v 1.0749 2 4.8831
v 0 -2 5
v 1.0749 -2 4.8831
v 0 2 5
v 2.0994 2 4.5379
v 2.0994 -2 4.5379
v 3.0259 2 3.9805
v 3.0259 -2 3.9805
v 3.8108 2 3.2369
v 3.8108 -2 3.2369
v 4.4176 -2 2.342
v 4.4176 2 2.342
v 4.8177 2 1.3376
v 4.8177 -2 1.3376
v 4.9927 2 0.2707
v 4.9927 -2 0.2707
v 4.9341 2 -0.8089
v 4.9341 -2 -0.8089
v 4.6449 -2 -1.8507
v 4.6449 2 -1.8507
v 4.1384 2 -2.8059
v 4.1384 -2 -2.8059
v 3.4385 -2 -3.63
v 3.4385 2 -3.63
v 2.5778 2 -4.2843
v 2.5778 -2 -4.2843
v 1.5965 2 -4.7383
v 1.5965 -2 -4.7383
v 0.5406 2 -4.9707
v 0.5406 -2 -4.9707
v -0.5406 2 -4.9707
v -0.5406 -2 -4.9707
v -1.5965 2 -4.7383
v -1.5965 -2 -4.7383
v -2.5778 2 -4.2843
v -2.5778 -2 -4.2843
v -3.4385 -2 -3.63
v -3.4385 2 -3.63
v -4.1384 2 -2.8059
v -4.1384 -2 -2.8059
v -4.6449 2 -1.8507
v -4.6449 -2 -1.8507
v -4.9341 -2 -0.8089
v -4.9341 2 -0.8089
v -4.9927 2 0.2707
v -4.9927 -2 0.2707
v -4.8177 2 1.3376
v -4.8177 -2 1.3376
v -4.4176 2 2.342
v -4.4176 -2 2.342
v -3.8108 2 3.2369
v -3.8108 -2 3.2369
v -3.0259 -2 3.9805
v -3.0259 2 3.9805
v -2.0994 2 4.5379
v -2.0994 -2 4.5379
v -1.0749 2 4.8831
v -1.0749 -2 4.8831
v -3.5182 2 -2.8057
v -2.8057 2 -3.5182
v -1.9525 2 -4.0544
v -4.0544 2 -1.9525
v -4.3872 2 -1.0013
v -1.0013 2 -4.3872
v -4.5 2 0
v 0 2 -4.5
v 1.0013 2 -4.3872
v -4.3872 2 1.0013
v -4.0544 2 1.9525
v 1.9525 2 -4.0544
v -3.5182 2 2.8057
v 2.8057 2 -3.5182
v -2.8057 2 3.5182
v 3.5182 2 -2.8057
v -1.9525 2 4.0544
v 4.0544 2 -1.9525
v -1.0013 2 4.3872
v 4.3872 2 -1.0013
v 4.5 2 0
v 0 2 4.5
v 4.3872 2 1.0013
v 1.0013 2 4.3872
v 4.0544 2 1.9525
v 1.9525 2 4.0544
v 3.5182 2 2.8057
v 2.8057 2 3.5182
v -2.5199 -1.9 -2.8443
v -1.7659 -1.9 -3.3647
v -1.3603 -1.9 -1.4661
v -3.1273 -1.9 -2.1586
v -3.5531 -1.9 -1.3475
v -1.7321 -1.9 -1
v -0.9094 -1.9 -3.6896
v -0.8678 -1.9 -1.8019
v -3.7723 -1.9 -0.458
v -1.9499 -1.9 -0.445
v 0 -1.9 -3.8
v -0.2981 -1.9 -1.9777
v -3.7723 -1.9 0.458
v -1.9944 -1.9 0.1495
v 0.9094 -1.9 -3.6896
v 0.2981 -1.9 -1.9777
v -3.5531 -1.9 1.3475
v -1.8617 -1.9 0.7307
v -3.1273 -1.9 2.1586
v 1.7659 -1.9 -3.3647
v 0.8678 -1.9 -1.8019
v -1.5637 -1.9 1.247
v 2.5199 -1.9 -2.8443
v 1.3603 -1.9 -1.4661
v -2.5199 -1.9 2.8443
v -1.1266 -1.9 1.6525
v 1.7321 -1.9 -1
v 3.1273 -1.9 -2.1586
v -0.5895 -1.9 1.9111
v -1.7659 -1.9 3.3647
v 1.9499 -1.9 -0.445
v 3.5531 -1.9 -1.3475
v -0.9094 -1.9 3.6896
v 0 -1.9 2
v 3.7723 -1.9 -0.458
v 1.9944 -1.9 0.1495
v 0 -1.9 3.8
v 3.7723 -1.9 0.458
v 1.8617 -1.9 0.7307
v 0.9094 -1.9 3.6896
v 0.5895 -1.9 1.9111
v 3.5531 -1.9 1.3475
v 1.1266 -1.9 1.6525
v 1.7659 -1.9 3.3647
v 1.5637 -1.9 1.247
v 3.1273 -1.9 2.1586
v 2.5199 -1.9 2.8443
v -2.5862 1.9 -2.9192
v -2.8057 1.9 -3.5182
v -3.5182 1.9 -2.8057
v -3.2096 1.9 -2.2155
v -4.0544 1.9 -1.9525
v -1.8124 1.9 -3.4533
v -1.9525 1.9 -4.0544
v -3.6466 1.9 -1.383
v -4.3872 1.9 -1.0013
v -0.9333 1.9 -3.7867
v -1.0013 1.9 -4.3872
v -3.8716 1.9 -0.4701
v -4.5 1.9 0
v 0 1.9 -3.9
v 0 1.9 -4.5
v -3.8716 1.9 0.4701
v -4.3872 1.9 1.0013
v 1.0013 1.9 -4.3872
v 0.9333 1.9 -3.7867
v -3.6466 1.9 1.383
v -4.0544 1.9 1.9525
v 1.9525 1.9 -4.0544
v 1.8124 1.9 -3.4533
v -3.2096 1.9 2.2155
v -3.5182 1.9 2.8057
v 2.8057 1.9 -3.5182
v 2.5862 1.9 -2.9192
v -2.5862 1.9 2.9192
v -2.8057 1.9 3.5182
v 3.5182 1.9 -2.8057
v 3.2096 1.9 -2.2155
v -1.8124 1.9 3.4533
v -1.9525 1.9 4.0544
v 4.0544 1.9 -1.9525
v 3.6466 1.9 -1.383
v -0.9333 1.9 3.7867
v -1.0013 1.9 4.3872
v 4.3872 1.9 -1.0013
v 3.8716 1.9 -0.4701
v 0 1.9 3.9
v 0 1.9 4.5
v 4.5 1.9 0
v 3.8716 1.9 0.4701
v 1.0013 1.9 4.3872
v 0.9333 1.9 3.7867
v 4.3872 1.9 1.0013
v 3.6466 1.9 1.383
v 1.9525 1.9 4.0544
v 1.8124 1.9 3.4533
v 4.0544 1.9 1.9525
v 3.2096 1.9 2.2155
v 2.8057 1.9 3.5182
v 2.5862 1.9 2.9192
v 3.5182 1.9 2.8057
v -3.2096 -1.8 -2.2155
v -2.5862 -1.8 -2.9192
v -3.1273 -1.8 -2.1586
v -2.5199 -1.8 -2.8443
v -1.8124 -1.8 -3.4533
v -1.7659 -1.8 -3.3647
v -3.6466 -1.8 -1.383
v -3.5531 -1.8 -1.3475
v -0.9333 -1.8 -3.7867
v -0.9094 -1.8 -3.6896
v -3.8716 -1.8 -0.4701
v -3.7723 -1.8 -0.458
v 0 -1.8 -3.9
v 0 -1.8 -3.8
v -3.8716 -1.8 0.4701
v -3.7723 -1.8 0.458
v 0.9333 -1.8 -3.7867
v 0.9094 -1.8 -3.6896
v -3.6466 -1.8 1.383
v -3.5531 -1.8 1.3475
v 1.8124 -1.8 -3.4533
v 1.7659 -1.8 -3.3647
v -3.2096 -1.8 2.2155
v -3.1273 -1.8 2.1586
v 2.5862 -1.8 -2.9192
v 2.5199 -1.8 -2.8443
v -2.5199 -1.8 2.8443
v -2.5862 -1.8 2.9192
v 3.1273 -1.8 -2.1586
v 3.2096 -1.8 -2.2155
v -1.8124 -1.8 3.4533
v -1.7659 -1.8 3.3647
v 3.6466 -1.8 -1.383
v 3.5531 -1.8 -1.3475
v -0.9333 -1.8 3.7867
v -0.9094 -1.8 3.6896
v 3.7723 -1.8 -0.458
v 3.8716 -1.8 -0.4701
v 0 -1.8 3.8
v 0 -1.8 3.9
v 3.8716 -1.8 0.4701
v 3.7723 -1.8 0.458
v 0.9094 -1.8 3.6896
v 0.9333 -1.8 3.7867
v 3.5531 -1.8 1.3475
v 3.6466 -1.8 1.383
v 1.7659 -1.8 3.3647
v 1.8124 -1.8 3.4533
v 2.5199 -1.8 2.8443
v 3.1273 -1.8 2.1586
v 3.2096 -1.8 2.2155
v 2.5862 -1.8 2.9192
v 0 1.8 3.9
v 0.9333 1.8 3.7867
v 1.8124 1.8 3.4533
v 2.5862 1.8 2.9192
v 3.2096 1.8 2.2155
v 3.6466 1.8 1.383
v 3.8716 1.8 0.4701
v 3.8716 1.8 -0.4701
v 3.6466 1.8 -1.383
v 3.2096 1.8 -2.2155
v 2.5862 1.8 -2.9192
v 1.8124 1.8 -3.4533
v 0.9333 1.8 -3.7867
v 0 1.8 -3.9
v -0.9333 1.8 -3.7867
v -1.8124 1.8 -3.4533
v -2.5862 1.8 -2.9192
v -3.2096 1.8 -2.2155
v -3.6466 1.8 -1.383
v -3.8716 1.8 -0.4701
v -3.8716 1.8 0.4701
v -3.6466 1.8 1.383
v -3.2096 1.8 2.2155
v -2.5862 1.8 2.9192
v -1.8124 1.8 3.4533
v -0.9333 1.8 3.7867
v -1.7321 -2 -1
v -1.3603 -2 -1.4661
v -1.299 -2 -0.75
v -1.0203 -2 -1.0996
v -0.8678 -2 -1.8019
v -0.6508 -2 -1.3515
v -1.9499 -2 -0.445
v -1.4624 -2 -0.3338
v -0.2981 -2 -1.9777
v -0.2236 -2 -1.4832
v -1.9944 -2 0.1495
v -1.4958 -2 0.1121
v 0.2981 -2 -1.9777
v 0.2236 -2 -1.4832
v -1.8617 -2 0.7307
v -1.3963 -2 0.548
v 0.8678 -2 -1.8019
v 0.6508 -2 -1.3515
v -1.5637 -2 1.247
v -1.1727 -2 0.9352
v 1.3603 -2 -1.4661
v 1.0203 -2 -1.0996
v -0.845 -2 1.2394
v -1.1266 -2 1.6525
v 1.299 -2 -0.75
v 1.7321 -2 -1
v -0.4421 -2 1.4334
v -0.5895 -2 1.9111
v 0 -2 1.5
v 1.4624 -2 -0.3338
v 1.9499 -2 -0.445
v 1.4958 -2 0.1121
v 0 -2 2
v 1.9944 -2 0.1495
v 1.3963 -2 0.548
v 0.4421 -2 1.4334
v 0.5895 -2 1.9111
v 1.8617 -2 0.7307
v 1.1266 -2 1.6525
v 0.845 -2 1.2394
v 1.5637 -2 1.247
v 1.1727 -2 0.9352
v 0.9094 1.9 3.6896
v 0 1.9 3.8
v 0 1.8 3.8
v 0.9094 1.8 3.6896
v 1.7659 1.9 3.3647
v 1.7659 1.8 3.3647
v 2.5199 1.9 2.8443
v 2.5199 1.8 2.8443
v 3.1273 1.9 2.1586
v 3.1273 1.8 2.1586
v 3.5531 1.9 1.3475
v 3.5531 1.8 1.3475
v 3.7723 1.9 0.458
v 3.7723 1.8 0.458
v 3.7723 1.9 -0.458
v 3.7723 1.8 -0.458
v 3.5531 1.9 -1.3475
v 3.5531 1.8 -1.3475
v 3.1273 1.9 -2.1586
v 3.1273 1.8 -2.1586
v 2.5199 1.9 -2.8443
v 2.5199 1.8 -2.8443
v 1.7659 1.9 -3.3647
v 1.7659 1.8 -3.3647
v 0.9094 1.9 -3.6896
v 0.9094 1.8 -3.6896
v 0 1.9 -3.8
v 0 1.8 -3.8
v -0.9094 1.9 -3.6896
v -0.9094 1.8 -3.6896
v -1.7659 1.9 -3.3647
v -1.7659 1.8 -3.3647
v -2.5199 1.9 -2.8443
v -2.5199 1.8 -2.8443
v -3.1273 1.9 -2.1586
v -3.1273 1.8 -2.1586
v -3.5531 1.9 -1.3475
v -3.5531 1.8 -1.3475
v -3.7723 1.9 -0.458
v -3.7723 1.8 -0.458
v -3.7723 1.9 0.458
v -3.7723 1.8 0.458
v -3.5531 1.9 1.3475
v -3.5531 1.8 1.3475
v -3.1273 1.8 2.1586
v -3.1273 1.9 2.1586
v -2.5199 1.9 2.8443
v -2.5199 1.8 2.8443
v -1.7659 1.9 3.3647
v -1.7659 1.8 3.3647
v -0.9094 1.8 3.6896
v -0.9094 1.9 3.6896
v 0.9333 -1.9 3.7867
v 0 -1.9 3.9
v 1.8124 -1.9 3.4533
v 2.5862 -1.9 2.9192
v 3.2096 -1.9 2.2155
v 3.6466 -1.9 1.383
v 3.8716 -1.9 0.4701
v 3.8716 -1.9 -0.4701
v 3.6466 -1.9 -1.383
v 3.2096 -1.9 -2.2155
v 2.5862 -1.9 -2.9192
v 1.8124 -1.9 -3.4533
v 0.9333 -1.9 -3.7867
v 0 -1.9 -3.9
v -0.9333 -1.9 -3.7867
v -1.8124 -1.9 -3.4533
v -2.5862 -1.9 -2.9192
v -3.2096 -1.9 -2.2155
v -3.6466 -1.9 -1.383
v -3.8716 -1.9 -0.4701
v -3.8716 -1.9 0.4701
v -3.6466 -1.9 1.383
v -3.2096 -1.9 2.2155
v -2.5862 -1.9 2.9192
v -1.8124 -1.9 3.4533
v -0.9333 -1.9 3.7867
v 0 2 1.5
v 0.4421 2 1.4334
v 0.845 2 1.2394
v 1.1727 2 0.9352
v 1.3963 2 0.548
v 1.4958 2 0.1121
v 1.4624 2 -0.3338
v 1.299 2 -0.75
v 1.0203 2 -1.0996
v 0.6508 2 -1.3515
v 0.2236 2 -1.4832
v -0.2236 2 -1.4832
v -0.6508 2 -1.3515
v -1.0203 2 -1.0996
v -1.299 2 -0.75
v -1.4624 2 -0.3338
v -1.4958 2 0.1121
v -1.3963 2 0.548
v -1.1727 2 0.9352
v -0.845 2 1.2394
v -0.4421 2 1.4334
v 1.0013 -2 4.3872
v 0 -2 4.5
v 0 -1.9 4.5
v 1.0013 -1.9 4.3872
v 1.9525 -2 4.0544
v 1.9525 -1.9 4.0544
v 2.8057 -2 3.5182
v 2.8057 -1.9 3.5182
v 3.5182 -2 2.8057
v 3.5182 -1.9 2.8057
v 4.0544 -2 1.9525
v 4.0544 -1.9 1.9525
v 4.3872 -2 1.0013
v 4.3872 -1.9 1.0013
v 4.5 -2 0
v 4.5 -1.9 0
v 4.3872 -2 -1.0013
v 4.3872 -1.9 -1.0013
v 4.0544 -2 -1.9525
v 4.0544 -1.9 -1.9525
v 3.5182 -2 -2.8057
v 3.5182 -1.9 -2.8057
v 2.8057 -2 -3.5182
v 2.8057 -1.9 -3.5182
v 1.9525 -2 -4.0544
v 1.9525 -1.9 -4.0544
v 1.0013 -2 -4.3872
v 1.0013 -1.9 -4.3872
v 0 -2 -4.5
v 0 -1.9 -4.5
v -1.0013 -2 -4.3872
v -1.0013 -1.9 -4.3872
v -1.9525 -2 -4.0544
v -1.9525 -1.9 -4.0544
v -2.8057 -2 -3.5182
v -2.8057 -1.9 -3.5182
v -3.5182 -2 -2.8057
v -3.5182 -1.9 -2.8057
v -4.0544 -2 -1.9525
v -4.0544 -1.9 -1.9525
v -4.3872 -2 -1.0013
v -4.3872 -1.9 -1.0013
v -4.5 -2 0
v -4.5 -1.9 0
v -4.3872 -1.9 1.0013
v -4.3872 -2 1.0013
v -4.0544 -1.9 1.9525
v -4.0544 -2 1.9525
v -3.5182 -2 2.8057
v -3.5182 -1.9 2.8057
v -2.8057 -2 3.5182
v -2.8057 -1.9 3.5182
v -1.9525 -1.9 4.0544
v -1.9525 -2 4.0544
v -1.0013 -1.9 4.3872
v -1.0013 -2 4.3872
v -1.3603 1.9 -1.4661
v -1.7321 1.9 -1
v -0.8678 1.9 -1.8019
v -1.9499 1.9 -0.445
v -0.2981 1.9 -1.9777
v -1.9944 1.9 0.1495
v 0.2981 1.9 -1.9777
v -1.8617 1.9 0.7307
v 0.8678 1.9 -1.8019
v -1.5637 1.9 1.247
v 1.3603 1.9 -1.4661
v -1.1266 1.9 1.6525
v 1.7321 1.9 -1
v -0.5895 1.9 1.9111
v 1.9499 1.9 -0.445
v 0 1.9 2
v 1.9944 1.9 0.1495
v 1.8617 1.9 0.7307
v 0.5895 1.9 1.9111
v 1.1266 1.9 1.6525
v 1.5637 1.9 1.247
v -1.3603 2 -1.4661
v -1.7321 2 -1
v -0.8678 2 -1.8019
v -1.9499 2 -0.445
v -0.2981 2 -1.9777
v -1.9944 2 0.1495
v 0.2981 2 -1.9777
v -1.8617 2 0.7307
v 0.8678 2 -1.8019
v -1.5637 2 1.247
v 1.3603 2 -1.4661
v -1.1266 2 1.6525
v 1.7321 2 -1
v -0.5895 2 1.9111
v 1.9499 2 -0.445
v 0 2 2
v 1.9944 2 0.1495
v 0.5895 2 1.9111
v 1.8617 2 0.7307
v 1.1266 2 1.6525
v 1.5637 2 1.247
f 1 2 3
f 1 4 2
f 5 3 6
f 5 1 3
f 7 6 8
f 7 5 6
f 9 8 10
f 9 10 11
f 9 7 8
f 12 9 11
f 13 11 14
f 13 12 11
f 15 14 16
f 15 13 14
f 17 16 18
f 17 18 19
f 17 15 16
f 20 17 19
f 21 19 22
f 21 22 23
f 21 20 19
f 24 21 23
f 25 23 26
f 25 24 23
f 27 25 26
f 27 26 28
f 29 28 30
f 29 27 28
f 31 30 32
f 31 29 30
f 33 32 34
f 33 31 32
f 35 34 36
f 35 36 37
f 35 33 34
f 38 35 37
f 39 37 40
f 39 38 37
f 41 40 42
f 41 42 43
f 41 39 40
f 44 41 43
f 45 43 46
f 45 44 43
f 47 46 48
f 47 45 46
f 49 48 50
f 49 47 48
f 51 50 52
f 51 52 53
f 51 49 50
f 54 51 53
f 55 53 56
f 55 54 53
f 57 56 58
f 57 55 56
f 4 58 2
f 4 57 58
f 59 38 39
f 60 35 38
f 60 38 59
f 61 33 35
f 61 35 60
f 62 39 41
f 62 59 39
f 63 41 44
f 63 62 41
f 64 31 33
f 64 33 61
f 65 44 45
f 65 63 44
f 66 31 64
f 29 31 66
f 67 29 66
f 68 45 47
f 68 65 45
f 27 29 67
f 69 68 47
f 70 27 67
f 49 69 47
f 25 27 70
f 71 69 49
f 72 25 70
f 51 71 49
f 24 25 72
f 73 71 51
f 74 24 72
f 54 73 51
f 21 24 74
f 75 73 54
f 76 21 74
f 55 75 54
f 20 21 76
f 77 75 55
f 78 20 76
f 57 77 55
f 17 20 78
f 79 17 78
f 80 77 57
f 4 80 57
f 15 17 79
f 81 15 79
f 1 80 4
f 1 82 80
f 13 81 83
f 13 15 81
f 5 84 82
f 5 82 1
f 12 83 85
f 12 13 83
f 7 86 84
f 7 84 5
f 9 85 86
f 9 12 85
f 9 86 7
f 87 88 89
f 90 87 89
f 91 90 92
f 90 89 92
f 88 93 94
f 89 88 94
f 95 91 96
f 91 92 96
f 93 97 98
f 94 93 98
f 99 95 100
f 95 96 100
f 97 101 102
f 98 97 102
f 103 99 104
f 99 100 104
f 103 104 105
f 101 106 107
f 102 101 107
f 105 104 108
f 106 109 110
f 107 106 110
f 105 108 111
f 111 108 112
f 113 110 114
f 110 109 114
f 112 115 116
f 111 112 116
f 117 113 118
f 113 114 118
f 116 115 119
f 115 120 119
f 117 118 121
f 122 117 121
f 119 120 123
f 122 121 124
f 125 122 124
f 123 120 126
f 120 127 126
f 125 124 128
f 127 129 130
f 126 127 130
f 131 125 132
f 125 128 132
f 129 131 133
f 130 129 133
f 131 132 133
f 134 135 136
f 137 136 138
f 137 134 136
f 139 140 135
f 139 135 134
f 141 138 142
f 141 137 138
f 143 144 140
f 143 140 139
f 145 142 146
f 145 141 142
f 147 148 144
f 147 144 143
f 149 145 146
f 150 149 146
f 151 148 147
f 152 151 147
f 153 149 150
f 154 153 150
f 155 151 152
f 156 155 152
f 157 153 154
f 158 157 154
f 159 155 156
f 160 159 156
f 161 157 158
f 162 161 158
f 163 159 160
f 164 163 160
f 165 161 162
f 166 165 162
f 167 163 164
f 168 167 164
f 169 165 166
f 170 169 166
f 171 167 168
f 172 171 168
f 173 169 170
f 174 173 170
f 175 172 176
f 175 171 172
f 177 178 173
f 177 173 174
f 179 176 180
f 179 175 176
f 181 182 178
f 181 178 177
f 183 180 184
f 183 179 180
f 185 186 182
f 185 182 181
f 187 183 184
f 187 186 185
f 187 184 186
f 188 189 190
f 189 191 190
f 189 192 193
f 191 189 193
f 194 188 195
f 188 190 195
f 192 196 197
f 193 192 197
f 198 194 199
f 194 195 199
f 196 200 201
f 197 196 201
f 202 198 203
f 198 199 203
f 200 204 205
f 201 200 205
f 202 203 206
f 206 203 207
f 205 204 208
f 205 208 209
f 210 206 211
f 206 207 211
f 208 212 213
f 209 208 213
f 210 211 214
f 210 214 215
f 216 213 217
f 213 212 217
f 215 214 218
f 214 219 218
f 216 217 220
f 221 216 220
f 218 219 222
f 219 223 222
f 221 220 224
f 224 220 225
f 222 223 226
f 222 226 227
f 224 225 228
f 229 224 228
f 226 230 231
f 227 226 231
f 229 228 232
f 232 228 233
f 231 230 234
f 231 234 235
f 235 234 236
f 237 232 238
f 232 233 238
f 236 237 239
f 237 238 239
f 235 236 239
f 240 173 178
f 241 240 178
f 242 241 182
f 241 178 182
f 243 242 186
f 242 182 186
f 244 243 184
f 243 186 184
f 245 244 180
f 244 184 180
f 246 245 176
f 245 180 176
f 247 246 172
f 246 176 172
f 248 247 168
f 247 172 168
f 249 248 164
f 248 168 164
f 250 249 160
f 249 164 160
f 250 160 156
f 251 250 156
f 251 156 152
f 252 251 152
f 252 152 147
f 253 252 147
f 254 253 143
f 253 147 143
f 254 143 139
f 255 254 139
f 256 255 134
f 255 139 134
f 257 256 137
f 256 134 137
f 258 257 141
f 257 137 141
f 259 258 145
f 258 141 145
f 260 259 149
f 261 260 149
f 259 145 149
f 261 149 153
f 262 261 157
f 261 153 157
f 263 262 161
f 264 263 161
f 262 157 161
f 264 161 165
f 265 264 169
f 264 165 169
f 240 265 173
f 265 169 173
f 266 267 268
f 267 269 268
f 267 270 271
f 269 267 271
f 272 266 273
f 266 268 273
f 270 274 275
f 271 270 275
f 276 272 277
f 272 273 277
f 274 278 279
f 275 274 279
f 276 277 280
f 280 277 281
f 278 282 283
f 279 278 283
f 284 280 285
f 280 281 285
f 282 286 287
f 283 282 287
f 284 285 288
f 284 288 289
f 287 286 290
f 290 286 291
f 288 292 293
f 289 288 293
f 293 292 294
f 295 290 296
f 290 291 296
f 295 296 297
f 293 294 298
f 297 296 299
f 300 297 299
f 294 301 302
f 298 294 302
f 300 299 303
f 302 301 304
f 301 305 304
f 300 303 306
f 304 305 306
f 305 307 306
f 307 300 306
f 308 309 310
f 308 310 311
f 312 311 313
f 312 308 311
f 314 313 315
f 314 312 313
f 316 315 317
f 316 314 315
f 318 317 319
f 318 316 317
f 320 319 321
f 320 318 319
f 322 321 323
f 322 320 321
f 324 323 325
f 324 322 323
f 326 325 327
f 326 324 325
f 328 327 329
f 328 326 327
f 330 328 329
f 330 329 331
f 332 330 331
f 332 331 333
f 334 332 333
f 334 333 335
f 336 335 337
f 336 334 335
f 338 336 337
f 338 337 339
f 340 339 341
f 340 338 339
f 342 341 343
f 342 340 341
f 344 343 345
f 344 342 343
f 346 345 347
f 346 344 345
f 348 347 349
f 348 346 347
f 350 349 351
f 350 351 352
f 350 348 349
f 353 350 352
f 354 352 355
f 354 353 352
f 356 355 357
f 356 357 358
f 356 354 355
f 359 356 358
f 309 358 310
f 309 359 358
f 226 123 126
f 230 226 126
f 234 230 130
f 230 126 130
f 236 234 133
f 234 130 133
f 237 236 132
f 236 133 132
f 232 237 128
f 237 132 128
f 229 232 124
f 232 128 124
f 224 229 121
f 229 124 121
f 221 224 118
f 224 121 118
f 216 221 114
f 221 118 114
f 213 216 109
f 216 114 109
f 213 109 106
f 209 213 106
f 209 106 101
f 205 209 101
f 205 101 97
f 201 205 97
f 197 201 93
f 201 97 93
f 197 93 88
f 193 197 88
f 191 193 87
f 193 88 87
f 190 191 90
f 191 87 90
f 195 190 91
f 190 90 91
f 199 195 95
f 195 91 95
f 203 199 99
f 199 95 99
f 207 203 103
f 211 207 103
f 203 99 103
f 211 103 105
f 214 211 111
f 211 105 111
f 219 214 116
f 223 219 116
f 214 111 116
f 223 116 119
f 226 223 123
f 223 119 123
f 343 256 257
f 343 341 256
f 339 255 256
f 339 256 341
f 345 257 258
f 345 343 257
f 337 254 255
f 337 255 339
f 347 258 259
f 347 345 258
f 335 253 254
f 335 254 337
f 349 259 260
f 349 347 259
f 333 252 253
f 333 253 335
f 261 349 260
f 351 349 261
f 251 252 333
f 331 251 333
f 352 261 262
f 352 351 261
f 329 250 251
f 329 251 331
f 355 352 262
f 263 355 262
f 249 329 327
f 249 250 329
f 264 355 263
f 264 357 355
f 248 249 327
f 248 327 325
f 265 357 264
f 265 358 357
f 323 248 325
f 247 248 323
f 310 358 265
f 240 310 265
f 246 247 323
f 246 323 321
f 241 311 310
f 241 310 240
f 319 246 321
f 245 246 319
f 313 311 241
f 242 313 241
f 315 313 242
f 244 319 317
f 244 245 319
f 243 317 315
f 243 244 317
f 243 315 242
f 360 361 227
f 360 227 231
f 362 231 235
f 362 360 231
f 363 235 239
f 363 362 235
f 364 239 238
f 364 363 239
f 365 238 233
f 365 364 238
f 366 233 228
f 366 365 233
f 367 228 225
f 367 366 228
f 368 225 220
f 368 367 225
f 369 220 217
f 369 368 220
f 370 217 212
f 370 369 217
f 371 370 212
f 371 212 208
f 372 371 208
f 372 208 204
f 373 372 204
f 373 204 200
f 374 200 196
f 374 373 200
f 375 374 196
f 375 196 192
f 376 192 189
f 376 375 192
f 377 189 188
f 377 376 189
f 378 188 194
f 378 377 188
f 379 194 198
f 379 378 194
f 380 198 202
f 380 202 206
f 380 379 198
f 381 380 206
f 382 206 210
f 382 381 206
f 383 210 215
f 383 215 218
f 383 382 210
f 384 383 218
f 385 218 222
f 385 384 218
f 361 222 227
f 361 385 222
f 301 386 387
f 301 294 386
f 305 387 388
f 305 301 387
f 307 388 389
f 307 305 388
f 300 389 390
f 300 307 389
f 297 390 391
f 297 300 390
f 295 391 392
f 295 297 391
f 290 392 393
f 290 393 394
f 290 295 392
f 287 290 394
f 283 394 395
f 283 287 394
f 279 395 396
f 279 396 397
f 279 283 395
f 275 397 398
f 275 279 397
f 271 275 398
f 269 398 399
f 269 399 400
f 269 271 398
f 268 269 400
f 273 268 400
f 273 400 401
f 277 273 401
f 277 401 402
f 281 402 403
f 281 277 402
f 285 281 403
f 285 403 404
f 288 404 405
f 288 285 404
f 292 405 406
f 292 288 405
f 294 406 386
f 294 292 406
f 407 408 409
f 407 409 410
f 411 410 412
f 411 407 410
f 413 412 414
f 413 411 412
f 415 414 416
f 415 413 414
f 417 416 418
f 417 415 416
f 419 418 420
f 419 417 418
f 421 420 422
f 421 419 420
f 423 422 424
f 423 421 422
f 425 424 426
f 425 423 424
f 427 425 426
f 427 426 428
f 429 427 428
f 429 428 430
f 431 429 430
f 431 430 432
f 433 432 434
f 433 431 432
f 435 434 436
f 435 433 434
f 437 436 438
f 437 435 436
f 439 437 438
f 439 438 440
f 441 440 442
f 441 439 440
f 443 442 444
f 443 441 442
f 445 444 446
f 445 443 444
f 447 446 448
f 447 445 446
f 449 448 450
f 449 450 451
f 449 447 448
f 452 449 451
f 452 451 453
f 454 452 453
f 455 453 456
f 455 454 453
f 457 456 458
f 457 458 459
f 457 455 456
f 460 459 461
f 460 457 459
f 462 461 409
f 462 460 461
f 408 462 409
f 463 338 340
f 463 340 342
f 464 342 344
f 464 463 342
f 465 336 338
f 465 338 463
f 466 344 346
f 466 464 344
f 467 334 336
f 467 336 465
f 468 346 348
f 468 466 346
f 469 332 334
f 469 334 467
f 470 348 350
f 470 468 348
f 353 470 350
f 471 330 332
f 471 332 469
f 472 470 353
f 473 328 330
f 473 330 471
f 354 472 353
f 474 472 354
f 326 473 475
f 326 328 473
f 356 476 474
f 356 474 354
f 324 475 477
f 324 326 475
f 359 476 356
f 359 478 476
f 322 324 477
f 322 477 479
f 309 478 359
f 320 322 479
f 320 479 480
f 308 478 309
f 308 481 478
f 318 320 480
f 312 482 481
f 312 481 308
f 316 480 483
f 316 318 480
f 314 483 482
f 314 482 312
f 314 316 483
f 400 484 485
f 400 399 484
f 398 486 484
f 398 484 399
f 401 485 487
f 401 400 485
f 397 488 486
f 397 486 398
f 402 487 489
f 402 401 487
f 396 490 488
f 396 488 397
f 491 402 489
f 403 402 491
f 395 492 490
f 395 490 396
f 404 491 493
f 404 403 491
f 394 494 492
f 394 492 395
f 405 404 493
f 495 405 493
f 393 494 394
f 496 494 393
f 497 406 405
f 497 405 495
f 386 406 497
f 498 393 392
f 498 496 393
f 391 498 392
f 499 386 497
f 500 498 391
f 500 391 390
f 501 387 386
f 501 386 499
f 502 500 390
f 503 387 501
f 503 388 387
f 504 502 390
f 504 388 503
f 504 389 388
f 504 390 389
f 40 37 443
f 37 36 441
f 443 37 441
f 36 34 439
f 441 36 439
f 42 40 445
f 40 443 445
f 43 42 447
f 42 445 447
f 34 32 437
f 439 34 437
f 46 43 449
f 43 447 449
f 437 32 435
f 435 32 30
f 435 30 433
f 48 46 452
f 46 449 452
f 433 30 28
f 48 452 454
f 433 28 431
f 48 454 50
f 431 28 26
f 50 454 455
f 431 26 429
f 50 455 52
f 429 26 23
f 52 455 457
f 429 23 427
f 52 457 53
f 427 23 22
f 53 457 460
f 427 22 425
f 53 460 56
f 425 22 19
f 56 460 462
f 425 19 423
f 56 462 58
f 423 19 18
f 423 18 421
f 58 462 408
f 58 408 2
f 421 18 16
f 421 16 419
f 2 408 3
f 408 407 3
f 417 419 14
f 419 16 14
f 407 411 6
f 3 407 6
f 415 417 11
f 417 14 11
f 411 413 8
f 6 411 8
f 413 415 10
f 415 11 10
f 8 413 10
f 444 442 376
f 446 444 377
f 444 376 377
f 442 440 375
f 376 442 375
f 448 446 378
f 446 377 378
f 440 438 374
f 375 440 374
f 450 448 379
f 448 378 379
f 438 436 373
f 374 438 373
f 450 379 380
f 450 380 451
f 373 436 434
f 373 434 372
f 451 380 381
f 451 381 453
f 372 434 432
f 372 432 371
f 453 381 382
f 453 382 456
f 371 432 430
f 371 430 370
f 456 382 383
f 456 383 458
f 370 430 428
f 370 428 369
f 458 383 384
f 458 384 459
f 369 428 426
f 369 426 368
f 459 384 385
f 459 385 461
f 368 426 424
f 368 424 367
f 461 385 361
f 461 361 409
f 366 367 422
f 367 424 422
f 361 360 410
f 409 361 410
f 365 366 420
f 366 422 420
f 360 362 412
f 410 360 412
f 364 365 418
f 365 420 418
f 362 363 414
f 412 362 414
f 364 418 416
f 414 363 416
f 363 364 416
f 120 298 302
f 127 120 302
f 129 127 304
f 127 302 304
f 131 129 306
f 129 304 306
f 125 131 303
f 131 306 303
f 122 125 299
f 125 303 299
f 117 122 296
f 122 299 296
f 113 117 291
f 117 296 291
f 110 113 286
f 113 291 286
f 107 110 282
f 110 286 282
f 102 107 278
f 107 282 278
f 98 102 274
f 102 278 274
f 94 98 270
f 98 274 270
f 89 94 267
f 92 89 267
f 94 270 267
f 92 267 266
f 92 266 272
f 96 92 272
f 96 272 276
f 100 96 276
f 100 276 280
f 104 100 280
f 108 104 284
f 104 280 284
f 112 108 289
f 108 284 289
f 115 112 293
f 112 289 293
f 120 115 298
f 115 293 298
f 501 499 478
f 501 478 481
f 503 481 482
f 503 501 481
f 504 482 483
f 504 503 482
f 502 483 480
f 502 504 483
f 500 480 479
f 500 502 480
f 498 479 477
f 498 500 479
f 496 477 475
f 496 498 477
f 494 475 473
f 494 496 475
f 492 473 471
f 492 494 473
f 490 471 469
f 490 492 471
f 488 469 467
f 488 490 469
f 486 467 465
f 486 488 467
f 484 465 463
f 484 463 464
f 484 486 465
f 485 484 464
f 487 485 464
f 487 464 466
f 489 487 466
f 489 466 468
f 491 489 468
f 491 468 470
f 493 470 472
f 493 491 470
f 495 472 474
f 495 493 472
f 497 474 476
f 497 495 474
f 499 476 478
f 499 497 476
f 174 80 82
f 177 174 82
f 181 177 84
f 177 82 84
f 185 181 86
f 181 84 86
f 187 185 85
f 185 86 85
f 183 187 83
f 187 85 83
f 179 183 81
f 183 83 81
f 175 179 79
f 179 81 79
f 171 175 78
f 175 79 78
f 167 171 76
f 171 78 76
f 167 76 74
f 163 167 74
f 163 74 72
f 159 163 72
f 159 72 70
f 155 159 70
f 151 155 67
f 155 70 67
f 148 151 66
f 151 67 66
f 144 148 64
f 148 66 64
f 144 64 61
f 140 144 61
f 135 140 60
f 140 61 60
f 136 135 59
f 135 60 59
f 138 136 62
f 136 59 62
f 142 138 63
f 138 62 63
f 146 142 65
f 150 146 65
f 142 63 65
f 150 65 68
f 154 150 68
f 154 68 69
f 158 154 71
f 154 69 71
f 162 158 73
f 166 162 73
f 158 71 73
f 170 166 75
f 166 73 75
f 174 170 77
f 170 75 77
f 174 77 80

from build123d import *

# Parameters (mm, degrees)
SKETCH_1_R          = 5
SKETCH_1_R_2        = 1.5
EXTRUDE_1_DEPTH     = 2
SKETCH_2_R          = 4.5
SKETCH_2_R_2        = 2
CUT_EXTRUDE_1_DEPTH = 0.1
SKETCH_4_R          = 3.9
SKETCH_4_R_2        = 3.8
CUT_EXTRUDE_2_DEPTH = 0.1


with BuildPart() as part:
    # Эскиз1 → Бобышка-Вытянуть1 (new, symmetric)
    with BuildSketch(Plane(origin=(0, 0, 0), x_dir=(1, 0, 0), z_dir=(0, 1, 0))):
        with Locations(Location((0, 0, 0), (0, 0, 270))):
            Circle(SKETCH_1_R)
        with Locations(Location((0, 0, 0), (0, 0, 270))):
            Circle(SKETCH_1_R_2, mode=Mode.SUBTRACT)
    extrude(amount=EXTRUDE_1_DEPTH, both=True)

    # Эскиз2 → Вырез-Вытянуть1 (cut)
    with BuildSketch(Plane(origin=(0, 2, 0), x_dir=(1, 0, 0), z_dir=(0, 1, 0))):
        with Locations(Location((0, 0, 0), (0, 0, 270))):
            Circle(SKETCH_2_R)
        with Locations(Location((0, 0, 0), (0, 0, 270))):
            Circle(SKETCH_2_R_2, mode=Mode.SUBTRACT)
    cut_extrude_1 = extrude(amount=-CUT_EXTRUDE_1_DEPTH, mode=Mode.SUBTRACT)

    # Эскиз4 → Вырез-Вытянуть2 (cut)
    with BuildSketch(Plane(origin=(0, 1.9, 0), x_dir=(1, 0, 0), z_dir=(0, 1, 0))):
        with Locations(Location((0, 0, 0), (0, 0, 270))):
            Circle(SKETCH_4_R)
        with Locations(Location((0, 0, 0), (0, 0, 270))):
            Circle(SKETCH_4_R_2, mode=Mode.SUBTRACT)
    cut_extrude_2 = extrude(amount=-CUT_EXTRUDE_2_DEPTH, mode=Mode.SUBTRACT)

    # Зеркальное отражение1: Вырез-Вытянуть1, Вырез-Вытянуть2 across plane
    add(cut_extrude_1.mirror(Plane.ZX), mode=Mode.SUBTRACT)
    add(cut_extrude_2.mirror(Plane.ZX), mode=Mode.SUBTRACT)


solid = part.part
